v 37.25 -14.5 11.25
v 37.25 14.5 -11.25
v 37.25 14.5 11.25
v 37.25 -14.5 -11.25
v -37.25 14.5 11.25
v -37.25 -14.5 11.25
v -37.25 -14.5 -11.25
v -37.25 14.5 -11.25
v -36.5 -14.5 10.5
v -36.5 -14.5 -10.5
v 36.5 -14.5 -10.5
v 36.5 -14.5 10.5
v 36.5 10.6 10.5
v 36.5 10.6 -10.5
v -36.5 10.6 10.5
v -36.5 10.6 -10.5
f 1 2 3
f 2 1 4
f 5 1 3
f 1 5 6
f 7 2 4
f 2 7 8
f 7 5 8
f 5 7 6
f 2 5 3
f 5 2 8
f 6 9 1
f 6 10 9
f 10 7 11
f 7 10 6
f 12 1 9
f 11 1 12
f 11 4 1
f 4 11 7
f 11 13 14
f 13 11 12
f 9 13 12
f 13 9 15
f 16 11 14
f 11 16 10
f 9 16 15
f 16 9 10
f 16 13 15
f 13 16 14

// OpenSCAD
// file: parameters.scad
//parameters
//thickness of box sides
wall = 2;

//width of cards, including sleeves and extra space
crdX = 70;

//length of cards including sleeves and extra space
crdY = 93;                  

//height of the entire pile of cards.  modify if you have more cards
crdZ = 18;

//how much of the main box is tapered to accommodate the lid
lidY = 25;

//the size of the taper
lidDiff = 0.75;

//The amount of "looseness" between the lid and the box on each side
lidSpacing = 0.25;

sideFontName="Impact";
sideFontSize=10;
sideFontLeftPadding=2;

//constant to avoid coincident faces.  don't change this
_min=0.1;

//calculated values
trayX = crdX+(2*wall);
trayY = crdY+(2*wall);
trayZ = crdZ+(2*wall);
// main file
include <parameters.scad>


difference(){
cube([trayX+(2*lidSpacing), lidY+(2*wall), trayZ+(2*lidSpacing)],center=true);
    
translate([0,-(2*wall)+_min+1,0])
        cube([trayX-(2*lidDiff)+(2*lidSpacing),lidY+wall,trayZ-(2*lidDiff)+(2*lidSpacing)],center=true);
}
